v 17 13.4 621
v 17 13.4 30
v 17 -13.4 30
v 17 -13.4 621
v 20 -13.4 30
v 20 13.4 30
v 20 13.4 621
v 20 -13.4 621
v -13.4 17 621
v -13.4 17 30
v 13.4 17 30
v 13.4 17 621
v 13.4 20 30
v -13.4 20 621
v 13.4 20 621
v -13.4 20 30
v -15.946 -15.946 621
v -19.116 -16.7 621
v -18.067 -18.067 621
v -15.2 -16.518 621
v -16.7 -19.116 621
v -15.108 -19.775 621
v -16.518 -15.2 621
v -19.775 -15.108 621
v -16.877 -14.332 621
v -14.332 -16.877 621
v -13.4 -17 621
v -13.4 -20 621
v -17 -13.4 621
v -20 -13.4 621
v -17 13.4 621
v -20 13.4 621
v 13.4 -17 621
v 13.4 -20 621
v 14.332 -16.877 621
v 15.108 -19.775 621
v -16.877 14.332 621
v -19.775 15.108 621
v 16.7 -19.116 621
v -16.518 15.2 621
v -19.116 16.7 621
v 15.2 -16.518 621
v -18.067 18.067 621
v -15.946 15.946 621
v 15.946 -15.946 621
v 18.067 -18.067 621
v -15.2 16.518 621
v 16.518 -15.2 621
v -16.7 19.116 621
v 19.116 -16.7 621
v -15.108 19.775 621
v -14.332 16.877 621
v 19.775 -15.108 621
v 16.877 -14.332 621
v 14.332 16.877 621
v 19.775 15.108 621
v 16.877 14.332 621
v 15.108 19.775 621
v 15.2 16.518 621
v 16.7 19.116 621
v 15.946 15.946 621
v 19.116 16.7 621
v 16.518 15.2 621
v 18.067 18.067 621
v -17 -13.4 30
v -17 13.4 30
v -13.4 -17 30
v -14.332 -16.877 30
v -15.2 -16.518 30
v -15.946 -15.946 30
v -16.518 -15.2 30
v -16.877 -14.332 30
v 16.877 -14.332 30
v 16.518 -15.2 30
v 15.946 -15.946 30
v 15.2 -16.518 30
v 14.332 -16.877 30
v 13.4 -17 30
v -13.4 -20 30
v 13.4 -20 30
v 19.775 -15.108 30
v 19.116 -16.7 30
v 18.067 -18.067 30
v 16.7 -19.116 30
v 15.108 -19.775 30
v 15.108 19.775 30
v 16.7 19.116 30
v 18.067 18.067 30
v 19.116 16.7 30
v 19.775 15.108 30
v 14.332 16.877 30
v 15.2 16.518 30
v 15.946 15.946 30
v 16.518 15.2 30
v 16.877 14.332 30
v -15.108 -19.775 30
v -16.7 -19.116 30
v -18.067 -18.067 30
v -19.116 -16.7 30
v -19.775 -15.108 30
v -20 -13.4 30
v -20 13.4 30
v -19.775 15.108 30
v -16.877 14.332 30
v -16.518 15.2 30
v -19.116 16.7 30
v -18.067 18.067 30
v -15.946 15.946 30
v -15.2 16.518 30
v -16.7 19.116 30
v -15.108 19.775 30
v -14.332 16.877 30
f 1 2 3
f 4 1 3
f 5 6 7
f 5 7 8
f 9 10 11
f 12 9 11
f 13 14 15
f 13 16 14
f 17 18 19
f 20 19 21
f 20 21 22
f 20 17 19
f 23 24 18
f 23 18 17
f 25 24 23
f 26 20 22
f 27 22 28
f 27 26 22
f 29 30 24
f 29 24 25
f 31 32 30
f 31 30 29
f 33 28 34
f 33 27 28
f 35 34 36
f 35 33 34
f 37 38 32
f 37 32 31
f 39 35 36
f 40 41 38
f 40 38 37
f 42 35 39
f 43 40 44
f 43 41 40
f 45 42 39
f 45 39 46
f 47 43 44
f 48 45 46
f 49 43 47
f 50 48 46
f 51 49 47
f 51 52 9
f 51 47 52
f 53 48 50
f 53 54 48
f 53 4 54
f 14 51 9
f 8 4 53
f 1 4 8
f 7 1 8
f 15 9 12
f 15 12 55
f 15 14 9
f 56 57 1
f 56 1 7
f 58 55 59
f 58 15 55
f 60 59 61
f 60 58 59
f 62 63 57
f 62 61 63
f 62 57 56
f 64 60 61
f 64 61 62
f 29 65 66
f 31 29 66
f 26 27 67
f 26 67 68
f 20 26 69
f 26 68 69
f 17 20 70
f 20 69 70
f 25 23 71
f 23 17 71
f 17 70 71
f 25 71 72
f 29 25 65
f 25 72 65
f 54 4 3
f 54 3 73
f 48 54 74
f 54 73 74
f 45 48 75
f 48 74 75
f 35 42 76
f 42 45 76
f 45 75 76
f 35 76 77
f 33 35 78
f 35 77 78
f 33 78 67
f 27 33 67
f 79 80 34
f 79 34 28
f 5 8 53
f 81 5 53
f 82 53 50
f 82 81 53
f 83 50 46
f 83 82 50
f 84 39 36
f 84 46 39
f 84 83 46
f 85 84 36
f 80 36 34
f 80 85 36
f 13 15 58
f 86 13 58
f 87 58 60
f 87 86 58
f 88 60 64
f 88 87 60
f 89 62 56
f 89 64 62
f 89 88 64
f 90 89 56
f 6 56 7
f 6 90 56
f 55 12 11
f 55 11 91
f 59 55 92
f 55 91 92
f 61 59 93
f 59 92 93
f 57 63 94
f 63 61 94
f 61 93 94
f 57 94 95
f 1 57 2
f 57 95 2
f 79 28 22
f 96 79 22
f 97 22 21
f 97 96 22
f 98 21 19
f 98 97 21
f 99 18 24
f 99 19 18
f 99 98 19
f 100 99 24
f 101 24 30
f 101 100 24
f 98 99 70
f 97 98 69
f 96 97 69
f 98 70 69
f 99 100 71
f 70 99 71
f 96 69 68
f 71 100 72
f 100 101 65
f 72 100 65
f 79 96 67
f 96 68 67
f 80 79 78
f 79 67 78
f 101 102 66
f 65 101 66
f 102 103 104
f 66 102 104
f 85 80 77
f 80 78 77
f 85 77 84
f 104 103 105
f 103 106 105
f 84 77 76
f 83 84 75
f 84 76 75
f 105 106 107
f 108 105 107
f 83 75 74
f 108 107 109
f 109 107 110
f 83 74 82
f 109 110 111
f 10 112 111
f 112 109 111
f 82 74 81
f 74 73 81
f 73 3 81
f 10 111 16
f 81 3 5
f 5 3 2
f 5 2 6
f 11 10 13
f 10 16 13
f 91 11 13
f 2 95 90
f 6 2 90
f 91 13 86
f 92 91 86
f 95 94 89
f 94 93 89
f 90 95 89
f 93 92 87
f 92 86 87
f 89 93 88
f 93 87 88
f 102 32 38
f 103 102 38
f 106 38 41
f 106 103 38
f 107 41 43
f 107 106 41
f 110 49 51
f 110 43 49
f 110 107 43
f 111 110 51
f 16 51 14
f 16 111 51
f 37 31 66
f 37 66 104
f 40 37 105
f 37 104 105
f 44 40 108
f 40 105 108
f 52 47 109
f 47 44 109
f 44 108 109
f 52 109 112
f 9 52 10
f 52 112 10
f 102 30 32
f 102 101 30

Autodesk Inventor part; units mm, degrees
ref_plane "Start plane" through (0, 0, 30) normal (0, 0, 1) x (1, 0, 0)
ref_plane "End plane" through (0, 0, 621) normal (0, 0, 1) x (1, 0, 0)
sketch "Sketch" plane through (0, 0, 0) normal (0, 0, 1) x (1, 0, 0)
  line L0 (-20, -13.4) -> (-20, 13.4)
  line L1 (-13.4, 20) -> (13.4, 20)
  line L2 (20, 13.4) -> (20, -13.4)
  line L3 (13.4, -20) -> (-13.4, -20)
  arc A0 (-20, -13.4) -> (-13.4, -20) centre (-13.4, -13.4) ccw
  arc A1 (-13.4, 20) -> (-20, 13.4) centre (-13.4, 13.4) ccw
  arc A2 (20, 13.4) -> (13.4, 20) centre (13.4, 13.4) ccw
  arc A3 (13.4, -20) -> (20, -13.4) centre (13.4, -13.4) ccw
  arc A4 (-13.4, 17) -> (-17, 13.4) centre (-13.4, 13.4) ccw
  line L4 (-13.4, 17) -> (13.4, 17)
  arc A5 (17, 13.4) -> (13.4, 17) centre (13.4, 13.4) ccw
  line L5 (17, 13.4) -> (17, -13.4)
  arc A6 (13.4, -17) -> (17, -13.4) centre (13.4, -13.4) ccw
  line L6 (13.4, -17) -> (-13.4, -17)
  arc A7 (-17, -13.4) -> (-13.4, -17) centre (-13.4, -13.4) ccw
  line L7 (-17, -13.4) -> (-17, 13.4)
  line L8 (0, 22.0873) -> (0, -22.0873) construction
  line L9 (-22.0873, 0) -> (22.0873, 0) construction
  dimension "d7" = 6.6
  dimension "d10" = 40
  dimension "d11" = 40
  dimension "d12" = 3
  dimension "d15" = 20
  dimension "d16" = 20
extrude "Body" add sketch "Sketch" along normal up to surface (591 mm away) from surface at 30
sketch "Sketch3" plane through (0, 0, 0) normal (0, 0, 1) x (1, 0, 0)
  line L0 (0, 0) -> (10, 0)
ref_plane "Work Plane3" through (0, 0, 0) normal (0, -1, 0) x (1, 0, 0)
sketch "Sketch4" plane through (0, 0, 0) normal (0, -1, 0) x (1, 0, 0)
  line L0 (-2, 30) -> (12, 30)
  line L1 (-2, 621) -> (12, 621)
  dimension "d18" = 591
ref_plane "Work Plane5" through (29.2, 615, 621) normal (0, 0, 1) x (1, 0, 0)
split "Split2" plane through (29.2, 615, 621) removes the side toward (0, 0, 1)
ref_plane "Work Plane6" through (29.2, -235, 30) normal (0, 0, -1) x (-1, 0, 0)
split "Split3" plane through (29.2, -235, 30) removes the side toward (0, 0, -1)
equation "\"d7\" = G_IR"
equation "\"d10\" = G_H"
equation "\"d11\" = G_W"
equation "\"d12\" = G_T"
equation "\"d15\" = 0.5 * d10"
equation "\"d16\" = 0.5 * d11"
equation "\"d3\" = G_L"
equation "\"G_W\" = 40"
equation "\"G_H\" = 40"
equation "\"G_T\" = 3"
equation "\"G_IR\" = 6.6"
equation "\"G_L\" = d18"
equation "\"d14\" = G_OFFSET_END + B_L"
equation "\"B_L\" = 651"
equation "\"G_OFFSET_END\" = -30"
properties part number "DIN EN 10305-5 - 40 x 40 x 3  - 591" material "Steel, Mild"
